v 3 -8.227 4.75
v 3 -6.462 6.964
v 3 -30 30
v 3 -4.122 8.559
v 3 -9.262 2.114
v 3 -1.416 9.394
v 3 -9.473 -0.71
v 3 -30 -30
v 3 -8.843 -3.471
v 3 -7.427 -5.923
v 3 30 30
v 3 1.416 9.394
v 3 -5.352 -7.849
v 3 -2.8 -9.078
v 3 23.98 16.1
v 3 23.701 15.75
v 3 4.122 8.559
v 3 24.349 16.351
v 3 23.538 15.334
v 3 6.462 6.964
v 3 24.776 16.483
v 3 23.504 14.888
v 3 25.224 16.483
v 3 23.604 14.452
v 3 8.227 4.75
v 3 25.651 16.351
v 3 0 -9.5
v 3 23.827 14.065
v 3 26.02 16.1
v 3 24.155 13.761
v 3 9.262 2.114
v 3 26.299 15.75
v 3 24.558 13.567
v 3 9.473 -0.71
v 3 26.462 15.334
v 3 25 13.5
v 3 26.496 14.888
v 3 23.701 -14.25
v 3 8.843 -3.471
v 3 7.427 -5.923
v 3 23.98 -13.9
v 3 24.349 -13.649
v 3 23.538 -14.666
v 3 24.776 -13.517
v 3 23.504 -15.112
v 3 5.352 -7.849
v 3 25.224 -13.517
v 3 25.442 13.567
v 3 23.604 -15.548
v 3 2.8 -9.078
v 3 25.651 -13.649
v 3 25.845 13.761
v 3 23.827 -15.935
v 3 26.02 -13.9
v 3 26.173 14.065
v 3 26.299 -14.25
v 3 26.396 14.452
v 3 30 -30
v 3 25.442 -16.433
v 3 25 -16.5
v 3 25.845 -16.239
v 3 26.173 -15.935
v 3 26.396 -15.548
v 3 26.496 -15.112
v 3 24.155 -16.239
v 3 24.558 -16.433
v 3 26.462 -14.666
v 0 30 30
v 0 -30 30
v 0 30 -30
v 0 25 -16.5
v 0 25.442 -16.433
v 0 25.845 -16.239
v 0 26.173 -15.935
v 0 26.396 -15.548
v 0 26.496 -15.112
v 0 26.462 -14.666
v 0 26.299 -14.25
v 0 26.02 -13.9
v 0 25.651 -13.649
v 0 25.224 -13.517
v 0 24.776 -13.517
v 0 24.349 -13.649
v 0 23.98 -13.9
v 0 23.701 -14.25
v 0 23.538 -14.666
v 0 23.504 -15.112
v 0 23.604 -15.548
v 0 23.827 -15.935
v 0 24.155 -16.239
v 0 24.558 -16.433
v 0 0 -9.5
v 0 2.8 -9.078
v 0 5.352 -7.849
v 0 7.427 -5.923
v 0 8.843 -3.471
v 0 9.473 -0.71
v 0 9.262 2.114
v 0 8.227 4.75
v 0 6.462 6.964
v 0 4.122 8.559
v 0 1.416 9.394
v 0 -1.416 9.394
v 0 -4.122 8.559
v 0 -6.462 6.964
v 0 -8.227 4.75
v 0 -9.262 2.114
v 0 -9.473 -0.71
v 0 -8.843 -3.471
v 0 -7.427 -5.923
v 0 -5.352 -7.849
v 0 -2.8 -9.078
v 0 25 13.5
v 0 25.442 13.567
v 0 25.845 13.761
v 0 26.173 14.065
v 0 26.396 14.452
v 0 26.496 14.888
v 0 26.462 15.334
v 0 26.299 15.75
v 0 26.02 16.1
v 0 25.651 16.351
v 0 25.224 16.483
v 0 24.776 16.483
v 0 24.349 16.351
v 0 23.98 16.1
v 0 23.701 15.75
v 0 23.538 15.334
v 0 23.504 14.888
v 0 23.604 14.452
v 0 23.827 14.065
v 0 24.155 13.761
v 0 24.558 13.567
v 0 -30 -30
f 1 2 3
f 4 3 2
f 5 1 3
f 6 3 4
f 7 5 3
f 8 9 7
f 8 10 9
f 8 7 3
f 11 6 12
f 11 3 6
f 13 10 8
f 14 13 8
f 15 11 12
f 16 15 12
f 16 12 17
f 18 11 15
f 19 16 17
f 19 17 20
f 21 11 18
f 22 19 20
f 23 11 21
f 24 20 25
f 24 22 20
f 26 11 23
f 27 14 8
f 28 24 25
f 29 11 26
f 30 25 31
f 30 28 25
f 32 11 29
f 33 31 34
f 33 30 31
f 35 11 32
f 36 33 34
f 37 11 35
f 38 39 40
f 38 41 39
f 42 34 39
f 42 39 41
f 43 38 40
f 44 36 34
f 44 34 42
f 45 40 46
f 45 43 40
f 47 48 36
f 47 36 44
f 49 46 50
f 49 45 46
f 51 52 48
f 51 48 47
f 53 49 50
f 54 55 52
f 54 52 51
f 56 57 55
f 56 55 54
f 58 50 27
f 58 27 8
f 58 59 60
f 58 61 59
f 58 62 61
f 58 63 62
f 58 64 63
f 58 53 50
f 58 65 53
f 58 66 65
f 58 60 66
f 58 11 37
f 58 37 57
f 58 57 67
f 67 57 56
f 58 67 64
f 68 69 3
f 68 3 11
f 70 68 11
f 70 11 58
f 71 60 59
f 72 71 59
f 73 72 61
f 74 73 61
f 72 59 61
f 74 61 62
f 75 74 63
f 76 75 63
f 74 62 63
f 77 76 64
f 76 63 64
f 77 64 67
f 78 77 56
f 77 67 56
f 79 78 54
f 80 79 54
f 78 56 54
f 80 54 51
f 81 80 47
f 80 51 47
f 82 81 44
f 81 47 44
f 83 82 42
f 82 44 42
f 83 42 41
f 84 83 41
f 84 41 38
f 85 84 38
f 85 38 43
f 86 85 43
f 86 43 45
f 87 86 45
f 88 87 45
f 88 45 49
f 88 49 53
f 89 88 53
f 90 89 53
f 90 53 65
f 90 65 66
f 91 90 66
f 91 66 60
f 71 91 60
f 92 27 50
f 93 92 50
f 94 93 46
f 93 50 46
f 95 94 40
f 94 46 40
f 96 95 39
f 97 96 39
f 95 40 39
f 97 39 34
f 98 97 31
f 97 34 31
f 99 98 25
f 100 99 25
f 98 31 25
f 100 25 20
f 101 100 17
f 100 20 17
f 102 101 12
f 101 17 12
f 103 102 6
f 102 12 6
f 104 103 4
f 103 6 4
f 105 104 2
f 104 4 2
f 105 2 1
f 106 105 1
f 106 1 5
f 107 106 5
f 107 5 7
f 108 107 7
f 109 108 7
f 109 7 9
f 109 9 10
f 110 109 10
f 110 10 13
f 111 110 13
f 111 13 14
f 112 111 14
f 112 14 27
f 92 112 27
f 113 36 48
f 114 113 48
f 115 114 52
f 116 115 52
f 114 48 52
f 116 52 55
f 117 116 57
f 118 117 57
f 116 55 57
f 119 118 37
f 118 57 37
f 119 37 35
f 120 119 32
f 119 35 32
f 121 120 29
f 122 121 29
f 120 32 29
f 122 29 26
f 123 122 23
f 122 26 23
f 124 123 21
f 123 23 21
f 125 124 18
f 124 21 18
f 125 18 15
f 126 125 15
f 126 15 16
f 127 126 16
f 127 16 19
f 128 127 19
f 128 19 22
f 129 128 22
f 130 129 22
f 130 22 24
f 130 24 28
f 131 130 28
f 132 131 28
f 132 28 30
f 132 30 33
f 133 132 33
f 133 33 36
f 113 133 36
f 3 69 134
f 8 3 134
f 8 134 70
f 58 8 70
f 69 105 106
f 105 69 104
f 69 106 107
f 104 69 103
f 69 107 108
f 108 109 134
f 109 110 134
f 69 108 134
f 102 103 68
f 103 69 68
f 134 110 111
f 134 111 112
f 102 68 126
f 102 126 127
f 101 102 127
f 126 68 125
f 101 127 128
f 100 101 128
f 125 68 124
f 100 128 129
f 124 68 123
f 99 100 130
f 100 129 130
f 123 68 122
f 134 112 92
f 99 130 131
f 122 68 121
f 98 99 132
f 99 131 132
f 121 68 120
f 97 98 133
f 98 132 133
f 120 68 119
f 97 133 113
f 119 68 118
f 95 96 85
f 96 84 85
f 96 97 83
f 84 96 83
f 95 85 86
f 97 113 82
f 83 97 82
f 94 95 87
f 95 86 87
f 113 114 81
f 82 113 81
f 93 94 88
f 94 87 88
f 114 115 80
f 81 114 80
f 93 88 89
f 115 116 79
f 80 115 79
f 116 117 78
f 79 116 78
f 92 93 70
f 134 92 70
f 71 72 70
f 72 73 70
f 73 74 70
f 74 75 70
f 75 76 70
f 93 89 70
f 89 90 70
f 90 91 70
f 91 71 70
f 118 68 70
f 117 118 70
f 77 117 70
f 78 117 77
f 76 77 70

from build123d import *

# Parameters (mm, degrees)
SKIZZE1_W                       = 60
SKIZZE1_H                       = 60
AUFSATZ_LINEAR_AUSTRAGEN1_DEPTH = 3
SKIZZE3_R                       = 1.5
SKIZZE3_R_2                     = 9.5
SCHNITT_LINEAR_AUSTRAGEN2_DEPTH = 43.532340636


with BuildPart() as part:
    # Skizze1 → Aufsatz-Linear austragen1 (new body)
    with BuildSketch(Plane(origin=(0, 0, 0), x_dir=(0, 0, -1), z_dir=(1, 0, 0))):
        Rectangle(SKIZZE1_W, SKIZZE1_H)
    extrude(amount=AUFSATZ_LINEAR_AUSTRAGEN1_DEPTH)

    # Skizze3 → Schnitt-Linear austragen2 (cut, through all)
    with BuildSketch(Plane(origin=(3, 0, 0), x_dir=(0, 0, -1), z_dir=(1, 0, 0))):
        with Locations((-15, 25)):
            Circle(SKIZZE3_R)
        with Locations((15, 25)):
            Circle(SKIZZE3_R)
        Circle(SKIZZE3_R_2)
    extrude(amount=-SCHNITT_LINEAR_AUSTRAGEN2_DEPTH, mode=Mode.SUBTRACT)


solid = part.part
